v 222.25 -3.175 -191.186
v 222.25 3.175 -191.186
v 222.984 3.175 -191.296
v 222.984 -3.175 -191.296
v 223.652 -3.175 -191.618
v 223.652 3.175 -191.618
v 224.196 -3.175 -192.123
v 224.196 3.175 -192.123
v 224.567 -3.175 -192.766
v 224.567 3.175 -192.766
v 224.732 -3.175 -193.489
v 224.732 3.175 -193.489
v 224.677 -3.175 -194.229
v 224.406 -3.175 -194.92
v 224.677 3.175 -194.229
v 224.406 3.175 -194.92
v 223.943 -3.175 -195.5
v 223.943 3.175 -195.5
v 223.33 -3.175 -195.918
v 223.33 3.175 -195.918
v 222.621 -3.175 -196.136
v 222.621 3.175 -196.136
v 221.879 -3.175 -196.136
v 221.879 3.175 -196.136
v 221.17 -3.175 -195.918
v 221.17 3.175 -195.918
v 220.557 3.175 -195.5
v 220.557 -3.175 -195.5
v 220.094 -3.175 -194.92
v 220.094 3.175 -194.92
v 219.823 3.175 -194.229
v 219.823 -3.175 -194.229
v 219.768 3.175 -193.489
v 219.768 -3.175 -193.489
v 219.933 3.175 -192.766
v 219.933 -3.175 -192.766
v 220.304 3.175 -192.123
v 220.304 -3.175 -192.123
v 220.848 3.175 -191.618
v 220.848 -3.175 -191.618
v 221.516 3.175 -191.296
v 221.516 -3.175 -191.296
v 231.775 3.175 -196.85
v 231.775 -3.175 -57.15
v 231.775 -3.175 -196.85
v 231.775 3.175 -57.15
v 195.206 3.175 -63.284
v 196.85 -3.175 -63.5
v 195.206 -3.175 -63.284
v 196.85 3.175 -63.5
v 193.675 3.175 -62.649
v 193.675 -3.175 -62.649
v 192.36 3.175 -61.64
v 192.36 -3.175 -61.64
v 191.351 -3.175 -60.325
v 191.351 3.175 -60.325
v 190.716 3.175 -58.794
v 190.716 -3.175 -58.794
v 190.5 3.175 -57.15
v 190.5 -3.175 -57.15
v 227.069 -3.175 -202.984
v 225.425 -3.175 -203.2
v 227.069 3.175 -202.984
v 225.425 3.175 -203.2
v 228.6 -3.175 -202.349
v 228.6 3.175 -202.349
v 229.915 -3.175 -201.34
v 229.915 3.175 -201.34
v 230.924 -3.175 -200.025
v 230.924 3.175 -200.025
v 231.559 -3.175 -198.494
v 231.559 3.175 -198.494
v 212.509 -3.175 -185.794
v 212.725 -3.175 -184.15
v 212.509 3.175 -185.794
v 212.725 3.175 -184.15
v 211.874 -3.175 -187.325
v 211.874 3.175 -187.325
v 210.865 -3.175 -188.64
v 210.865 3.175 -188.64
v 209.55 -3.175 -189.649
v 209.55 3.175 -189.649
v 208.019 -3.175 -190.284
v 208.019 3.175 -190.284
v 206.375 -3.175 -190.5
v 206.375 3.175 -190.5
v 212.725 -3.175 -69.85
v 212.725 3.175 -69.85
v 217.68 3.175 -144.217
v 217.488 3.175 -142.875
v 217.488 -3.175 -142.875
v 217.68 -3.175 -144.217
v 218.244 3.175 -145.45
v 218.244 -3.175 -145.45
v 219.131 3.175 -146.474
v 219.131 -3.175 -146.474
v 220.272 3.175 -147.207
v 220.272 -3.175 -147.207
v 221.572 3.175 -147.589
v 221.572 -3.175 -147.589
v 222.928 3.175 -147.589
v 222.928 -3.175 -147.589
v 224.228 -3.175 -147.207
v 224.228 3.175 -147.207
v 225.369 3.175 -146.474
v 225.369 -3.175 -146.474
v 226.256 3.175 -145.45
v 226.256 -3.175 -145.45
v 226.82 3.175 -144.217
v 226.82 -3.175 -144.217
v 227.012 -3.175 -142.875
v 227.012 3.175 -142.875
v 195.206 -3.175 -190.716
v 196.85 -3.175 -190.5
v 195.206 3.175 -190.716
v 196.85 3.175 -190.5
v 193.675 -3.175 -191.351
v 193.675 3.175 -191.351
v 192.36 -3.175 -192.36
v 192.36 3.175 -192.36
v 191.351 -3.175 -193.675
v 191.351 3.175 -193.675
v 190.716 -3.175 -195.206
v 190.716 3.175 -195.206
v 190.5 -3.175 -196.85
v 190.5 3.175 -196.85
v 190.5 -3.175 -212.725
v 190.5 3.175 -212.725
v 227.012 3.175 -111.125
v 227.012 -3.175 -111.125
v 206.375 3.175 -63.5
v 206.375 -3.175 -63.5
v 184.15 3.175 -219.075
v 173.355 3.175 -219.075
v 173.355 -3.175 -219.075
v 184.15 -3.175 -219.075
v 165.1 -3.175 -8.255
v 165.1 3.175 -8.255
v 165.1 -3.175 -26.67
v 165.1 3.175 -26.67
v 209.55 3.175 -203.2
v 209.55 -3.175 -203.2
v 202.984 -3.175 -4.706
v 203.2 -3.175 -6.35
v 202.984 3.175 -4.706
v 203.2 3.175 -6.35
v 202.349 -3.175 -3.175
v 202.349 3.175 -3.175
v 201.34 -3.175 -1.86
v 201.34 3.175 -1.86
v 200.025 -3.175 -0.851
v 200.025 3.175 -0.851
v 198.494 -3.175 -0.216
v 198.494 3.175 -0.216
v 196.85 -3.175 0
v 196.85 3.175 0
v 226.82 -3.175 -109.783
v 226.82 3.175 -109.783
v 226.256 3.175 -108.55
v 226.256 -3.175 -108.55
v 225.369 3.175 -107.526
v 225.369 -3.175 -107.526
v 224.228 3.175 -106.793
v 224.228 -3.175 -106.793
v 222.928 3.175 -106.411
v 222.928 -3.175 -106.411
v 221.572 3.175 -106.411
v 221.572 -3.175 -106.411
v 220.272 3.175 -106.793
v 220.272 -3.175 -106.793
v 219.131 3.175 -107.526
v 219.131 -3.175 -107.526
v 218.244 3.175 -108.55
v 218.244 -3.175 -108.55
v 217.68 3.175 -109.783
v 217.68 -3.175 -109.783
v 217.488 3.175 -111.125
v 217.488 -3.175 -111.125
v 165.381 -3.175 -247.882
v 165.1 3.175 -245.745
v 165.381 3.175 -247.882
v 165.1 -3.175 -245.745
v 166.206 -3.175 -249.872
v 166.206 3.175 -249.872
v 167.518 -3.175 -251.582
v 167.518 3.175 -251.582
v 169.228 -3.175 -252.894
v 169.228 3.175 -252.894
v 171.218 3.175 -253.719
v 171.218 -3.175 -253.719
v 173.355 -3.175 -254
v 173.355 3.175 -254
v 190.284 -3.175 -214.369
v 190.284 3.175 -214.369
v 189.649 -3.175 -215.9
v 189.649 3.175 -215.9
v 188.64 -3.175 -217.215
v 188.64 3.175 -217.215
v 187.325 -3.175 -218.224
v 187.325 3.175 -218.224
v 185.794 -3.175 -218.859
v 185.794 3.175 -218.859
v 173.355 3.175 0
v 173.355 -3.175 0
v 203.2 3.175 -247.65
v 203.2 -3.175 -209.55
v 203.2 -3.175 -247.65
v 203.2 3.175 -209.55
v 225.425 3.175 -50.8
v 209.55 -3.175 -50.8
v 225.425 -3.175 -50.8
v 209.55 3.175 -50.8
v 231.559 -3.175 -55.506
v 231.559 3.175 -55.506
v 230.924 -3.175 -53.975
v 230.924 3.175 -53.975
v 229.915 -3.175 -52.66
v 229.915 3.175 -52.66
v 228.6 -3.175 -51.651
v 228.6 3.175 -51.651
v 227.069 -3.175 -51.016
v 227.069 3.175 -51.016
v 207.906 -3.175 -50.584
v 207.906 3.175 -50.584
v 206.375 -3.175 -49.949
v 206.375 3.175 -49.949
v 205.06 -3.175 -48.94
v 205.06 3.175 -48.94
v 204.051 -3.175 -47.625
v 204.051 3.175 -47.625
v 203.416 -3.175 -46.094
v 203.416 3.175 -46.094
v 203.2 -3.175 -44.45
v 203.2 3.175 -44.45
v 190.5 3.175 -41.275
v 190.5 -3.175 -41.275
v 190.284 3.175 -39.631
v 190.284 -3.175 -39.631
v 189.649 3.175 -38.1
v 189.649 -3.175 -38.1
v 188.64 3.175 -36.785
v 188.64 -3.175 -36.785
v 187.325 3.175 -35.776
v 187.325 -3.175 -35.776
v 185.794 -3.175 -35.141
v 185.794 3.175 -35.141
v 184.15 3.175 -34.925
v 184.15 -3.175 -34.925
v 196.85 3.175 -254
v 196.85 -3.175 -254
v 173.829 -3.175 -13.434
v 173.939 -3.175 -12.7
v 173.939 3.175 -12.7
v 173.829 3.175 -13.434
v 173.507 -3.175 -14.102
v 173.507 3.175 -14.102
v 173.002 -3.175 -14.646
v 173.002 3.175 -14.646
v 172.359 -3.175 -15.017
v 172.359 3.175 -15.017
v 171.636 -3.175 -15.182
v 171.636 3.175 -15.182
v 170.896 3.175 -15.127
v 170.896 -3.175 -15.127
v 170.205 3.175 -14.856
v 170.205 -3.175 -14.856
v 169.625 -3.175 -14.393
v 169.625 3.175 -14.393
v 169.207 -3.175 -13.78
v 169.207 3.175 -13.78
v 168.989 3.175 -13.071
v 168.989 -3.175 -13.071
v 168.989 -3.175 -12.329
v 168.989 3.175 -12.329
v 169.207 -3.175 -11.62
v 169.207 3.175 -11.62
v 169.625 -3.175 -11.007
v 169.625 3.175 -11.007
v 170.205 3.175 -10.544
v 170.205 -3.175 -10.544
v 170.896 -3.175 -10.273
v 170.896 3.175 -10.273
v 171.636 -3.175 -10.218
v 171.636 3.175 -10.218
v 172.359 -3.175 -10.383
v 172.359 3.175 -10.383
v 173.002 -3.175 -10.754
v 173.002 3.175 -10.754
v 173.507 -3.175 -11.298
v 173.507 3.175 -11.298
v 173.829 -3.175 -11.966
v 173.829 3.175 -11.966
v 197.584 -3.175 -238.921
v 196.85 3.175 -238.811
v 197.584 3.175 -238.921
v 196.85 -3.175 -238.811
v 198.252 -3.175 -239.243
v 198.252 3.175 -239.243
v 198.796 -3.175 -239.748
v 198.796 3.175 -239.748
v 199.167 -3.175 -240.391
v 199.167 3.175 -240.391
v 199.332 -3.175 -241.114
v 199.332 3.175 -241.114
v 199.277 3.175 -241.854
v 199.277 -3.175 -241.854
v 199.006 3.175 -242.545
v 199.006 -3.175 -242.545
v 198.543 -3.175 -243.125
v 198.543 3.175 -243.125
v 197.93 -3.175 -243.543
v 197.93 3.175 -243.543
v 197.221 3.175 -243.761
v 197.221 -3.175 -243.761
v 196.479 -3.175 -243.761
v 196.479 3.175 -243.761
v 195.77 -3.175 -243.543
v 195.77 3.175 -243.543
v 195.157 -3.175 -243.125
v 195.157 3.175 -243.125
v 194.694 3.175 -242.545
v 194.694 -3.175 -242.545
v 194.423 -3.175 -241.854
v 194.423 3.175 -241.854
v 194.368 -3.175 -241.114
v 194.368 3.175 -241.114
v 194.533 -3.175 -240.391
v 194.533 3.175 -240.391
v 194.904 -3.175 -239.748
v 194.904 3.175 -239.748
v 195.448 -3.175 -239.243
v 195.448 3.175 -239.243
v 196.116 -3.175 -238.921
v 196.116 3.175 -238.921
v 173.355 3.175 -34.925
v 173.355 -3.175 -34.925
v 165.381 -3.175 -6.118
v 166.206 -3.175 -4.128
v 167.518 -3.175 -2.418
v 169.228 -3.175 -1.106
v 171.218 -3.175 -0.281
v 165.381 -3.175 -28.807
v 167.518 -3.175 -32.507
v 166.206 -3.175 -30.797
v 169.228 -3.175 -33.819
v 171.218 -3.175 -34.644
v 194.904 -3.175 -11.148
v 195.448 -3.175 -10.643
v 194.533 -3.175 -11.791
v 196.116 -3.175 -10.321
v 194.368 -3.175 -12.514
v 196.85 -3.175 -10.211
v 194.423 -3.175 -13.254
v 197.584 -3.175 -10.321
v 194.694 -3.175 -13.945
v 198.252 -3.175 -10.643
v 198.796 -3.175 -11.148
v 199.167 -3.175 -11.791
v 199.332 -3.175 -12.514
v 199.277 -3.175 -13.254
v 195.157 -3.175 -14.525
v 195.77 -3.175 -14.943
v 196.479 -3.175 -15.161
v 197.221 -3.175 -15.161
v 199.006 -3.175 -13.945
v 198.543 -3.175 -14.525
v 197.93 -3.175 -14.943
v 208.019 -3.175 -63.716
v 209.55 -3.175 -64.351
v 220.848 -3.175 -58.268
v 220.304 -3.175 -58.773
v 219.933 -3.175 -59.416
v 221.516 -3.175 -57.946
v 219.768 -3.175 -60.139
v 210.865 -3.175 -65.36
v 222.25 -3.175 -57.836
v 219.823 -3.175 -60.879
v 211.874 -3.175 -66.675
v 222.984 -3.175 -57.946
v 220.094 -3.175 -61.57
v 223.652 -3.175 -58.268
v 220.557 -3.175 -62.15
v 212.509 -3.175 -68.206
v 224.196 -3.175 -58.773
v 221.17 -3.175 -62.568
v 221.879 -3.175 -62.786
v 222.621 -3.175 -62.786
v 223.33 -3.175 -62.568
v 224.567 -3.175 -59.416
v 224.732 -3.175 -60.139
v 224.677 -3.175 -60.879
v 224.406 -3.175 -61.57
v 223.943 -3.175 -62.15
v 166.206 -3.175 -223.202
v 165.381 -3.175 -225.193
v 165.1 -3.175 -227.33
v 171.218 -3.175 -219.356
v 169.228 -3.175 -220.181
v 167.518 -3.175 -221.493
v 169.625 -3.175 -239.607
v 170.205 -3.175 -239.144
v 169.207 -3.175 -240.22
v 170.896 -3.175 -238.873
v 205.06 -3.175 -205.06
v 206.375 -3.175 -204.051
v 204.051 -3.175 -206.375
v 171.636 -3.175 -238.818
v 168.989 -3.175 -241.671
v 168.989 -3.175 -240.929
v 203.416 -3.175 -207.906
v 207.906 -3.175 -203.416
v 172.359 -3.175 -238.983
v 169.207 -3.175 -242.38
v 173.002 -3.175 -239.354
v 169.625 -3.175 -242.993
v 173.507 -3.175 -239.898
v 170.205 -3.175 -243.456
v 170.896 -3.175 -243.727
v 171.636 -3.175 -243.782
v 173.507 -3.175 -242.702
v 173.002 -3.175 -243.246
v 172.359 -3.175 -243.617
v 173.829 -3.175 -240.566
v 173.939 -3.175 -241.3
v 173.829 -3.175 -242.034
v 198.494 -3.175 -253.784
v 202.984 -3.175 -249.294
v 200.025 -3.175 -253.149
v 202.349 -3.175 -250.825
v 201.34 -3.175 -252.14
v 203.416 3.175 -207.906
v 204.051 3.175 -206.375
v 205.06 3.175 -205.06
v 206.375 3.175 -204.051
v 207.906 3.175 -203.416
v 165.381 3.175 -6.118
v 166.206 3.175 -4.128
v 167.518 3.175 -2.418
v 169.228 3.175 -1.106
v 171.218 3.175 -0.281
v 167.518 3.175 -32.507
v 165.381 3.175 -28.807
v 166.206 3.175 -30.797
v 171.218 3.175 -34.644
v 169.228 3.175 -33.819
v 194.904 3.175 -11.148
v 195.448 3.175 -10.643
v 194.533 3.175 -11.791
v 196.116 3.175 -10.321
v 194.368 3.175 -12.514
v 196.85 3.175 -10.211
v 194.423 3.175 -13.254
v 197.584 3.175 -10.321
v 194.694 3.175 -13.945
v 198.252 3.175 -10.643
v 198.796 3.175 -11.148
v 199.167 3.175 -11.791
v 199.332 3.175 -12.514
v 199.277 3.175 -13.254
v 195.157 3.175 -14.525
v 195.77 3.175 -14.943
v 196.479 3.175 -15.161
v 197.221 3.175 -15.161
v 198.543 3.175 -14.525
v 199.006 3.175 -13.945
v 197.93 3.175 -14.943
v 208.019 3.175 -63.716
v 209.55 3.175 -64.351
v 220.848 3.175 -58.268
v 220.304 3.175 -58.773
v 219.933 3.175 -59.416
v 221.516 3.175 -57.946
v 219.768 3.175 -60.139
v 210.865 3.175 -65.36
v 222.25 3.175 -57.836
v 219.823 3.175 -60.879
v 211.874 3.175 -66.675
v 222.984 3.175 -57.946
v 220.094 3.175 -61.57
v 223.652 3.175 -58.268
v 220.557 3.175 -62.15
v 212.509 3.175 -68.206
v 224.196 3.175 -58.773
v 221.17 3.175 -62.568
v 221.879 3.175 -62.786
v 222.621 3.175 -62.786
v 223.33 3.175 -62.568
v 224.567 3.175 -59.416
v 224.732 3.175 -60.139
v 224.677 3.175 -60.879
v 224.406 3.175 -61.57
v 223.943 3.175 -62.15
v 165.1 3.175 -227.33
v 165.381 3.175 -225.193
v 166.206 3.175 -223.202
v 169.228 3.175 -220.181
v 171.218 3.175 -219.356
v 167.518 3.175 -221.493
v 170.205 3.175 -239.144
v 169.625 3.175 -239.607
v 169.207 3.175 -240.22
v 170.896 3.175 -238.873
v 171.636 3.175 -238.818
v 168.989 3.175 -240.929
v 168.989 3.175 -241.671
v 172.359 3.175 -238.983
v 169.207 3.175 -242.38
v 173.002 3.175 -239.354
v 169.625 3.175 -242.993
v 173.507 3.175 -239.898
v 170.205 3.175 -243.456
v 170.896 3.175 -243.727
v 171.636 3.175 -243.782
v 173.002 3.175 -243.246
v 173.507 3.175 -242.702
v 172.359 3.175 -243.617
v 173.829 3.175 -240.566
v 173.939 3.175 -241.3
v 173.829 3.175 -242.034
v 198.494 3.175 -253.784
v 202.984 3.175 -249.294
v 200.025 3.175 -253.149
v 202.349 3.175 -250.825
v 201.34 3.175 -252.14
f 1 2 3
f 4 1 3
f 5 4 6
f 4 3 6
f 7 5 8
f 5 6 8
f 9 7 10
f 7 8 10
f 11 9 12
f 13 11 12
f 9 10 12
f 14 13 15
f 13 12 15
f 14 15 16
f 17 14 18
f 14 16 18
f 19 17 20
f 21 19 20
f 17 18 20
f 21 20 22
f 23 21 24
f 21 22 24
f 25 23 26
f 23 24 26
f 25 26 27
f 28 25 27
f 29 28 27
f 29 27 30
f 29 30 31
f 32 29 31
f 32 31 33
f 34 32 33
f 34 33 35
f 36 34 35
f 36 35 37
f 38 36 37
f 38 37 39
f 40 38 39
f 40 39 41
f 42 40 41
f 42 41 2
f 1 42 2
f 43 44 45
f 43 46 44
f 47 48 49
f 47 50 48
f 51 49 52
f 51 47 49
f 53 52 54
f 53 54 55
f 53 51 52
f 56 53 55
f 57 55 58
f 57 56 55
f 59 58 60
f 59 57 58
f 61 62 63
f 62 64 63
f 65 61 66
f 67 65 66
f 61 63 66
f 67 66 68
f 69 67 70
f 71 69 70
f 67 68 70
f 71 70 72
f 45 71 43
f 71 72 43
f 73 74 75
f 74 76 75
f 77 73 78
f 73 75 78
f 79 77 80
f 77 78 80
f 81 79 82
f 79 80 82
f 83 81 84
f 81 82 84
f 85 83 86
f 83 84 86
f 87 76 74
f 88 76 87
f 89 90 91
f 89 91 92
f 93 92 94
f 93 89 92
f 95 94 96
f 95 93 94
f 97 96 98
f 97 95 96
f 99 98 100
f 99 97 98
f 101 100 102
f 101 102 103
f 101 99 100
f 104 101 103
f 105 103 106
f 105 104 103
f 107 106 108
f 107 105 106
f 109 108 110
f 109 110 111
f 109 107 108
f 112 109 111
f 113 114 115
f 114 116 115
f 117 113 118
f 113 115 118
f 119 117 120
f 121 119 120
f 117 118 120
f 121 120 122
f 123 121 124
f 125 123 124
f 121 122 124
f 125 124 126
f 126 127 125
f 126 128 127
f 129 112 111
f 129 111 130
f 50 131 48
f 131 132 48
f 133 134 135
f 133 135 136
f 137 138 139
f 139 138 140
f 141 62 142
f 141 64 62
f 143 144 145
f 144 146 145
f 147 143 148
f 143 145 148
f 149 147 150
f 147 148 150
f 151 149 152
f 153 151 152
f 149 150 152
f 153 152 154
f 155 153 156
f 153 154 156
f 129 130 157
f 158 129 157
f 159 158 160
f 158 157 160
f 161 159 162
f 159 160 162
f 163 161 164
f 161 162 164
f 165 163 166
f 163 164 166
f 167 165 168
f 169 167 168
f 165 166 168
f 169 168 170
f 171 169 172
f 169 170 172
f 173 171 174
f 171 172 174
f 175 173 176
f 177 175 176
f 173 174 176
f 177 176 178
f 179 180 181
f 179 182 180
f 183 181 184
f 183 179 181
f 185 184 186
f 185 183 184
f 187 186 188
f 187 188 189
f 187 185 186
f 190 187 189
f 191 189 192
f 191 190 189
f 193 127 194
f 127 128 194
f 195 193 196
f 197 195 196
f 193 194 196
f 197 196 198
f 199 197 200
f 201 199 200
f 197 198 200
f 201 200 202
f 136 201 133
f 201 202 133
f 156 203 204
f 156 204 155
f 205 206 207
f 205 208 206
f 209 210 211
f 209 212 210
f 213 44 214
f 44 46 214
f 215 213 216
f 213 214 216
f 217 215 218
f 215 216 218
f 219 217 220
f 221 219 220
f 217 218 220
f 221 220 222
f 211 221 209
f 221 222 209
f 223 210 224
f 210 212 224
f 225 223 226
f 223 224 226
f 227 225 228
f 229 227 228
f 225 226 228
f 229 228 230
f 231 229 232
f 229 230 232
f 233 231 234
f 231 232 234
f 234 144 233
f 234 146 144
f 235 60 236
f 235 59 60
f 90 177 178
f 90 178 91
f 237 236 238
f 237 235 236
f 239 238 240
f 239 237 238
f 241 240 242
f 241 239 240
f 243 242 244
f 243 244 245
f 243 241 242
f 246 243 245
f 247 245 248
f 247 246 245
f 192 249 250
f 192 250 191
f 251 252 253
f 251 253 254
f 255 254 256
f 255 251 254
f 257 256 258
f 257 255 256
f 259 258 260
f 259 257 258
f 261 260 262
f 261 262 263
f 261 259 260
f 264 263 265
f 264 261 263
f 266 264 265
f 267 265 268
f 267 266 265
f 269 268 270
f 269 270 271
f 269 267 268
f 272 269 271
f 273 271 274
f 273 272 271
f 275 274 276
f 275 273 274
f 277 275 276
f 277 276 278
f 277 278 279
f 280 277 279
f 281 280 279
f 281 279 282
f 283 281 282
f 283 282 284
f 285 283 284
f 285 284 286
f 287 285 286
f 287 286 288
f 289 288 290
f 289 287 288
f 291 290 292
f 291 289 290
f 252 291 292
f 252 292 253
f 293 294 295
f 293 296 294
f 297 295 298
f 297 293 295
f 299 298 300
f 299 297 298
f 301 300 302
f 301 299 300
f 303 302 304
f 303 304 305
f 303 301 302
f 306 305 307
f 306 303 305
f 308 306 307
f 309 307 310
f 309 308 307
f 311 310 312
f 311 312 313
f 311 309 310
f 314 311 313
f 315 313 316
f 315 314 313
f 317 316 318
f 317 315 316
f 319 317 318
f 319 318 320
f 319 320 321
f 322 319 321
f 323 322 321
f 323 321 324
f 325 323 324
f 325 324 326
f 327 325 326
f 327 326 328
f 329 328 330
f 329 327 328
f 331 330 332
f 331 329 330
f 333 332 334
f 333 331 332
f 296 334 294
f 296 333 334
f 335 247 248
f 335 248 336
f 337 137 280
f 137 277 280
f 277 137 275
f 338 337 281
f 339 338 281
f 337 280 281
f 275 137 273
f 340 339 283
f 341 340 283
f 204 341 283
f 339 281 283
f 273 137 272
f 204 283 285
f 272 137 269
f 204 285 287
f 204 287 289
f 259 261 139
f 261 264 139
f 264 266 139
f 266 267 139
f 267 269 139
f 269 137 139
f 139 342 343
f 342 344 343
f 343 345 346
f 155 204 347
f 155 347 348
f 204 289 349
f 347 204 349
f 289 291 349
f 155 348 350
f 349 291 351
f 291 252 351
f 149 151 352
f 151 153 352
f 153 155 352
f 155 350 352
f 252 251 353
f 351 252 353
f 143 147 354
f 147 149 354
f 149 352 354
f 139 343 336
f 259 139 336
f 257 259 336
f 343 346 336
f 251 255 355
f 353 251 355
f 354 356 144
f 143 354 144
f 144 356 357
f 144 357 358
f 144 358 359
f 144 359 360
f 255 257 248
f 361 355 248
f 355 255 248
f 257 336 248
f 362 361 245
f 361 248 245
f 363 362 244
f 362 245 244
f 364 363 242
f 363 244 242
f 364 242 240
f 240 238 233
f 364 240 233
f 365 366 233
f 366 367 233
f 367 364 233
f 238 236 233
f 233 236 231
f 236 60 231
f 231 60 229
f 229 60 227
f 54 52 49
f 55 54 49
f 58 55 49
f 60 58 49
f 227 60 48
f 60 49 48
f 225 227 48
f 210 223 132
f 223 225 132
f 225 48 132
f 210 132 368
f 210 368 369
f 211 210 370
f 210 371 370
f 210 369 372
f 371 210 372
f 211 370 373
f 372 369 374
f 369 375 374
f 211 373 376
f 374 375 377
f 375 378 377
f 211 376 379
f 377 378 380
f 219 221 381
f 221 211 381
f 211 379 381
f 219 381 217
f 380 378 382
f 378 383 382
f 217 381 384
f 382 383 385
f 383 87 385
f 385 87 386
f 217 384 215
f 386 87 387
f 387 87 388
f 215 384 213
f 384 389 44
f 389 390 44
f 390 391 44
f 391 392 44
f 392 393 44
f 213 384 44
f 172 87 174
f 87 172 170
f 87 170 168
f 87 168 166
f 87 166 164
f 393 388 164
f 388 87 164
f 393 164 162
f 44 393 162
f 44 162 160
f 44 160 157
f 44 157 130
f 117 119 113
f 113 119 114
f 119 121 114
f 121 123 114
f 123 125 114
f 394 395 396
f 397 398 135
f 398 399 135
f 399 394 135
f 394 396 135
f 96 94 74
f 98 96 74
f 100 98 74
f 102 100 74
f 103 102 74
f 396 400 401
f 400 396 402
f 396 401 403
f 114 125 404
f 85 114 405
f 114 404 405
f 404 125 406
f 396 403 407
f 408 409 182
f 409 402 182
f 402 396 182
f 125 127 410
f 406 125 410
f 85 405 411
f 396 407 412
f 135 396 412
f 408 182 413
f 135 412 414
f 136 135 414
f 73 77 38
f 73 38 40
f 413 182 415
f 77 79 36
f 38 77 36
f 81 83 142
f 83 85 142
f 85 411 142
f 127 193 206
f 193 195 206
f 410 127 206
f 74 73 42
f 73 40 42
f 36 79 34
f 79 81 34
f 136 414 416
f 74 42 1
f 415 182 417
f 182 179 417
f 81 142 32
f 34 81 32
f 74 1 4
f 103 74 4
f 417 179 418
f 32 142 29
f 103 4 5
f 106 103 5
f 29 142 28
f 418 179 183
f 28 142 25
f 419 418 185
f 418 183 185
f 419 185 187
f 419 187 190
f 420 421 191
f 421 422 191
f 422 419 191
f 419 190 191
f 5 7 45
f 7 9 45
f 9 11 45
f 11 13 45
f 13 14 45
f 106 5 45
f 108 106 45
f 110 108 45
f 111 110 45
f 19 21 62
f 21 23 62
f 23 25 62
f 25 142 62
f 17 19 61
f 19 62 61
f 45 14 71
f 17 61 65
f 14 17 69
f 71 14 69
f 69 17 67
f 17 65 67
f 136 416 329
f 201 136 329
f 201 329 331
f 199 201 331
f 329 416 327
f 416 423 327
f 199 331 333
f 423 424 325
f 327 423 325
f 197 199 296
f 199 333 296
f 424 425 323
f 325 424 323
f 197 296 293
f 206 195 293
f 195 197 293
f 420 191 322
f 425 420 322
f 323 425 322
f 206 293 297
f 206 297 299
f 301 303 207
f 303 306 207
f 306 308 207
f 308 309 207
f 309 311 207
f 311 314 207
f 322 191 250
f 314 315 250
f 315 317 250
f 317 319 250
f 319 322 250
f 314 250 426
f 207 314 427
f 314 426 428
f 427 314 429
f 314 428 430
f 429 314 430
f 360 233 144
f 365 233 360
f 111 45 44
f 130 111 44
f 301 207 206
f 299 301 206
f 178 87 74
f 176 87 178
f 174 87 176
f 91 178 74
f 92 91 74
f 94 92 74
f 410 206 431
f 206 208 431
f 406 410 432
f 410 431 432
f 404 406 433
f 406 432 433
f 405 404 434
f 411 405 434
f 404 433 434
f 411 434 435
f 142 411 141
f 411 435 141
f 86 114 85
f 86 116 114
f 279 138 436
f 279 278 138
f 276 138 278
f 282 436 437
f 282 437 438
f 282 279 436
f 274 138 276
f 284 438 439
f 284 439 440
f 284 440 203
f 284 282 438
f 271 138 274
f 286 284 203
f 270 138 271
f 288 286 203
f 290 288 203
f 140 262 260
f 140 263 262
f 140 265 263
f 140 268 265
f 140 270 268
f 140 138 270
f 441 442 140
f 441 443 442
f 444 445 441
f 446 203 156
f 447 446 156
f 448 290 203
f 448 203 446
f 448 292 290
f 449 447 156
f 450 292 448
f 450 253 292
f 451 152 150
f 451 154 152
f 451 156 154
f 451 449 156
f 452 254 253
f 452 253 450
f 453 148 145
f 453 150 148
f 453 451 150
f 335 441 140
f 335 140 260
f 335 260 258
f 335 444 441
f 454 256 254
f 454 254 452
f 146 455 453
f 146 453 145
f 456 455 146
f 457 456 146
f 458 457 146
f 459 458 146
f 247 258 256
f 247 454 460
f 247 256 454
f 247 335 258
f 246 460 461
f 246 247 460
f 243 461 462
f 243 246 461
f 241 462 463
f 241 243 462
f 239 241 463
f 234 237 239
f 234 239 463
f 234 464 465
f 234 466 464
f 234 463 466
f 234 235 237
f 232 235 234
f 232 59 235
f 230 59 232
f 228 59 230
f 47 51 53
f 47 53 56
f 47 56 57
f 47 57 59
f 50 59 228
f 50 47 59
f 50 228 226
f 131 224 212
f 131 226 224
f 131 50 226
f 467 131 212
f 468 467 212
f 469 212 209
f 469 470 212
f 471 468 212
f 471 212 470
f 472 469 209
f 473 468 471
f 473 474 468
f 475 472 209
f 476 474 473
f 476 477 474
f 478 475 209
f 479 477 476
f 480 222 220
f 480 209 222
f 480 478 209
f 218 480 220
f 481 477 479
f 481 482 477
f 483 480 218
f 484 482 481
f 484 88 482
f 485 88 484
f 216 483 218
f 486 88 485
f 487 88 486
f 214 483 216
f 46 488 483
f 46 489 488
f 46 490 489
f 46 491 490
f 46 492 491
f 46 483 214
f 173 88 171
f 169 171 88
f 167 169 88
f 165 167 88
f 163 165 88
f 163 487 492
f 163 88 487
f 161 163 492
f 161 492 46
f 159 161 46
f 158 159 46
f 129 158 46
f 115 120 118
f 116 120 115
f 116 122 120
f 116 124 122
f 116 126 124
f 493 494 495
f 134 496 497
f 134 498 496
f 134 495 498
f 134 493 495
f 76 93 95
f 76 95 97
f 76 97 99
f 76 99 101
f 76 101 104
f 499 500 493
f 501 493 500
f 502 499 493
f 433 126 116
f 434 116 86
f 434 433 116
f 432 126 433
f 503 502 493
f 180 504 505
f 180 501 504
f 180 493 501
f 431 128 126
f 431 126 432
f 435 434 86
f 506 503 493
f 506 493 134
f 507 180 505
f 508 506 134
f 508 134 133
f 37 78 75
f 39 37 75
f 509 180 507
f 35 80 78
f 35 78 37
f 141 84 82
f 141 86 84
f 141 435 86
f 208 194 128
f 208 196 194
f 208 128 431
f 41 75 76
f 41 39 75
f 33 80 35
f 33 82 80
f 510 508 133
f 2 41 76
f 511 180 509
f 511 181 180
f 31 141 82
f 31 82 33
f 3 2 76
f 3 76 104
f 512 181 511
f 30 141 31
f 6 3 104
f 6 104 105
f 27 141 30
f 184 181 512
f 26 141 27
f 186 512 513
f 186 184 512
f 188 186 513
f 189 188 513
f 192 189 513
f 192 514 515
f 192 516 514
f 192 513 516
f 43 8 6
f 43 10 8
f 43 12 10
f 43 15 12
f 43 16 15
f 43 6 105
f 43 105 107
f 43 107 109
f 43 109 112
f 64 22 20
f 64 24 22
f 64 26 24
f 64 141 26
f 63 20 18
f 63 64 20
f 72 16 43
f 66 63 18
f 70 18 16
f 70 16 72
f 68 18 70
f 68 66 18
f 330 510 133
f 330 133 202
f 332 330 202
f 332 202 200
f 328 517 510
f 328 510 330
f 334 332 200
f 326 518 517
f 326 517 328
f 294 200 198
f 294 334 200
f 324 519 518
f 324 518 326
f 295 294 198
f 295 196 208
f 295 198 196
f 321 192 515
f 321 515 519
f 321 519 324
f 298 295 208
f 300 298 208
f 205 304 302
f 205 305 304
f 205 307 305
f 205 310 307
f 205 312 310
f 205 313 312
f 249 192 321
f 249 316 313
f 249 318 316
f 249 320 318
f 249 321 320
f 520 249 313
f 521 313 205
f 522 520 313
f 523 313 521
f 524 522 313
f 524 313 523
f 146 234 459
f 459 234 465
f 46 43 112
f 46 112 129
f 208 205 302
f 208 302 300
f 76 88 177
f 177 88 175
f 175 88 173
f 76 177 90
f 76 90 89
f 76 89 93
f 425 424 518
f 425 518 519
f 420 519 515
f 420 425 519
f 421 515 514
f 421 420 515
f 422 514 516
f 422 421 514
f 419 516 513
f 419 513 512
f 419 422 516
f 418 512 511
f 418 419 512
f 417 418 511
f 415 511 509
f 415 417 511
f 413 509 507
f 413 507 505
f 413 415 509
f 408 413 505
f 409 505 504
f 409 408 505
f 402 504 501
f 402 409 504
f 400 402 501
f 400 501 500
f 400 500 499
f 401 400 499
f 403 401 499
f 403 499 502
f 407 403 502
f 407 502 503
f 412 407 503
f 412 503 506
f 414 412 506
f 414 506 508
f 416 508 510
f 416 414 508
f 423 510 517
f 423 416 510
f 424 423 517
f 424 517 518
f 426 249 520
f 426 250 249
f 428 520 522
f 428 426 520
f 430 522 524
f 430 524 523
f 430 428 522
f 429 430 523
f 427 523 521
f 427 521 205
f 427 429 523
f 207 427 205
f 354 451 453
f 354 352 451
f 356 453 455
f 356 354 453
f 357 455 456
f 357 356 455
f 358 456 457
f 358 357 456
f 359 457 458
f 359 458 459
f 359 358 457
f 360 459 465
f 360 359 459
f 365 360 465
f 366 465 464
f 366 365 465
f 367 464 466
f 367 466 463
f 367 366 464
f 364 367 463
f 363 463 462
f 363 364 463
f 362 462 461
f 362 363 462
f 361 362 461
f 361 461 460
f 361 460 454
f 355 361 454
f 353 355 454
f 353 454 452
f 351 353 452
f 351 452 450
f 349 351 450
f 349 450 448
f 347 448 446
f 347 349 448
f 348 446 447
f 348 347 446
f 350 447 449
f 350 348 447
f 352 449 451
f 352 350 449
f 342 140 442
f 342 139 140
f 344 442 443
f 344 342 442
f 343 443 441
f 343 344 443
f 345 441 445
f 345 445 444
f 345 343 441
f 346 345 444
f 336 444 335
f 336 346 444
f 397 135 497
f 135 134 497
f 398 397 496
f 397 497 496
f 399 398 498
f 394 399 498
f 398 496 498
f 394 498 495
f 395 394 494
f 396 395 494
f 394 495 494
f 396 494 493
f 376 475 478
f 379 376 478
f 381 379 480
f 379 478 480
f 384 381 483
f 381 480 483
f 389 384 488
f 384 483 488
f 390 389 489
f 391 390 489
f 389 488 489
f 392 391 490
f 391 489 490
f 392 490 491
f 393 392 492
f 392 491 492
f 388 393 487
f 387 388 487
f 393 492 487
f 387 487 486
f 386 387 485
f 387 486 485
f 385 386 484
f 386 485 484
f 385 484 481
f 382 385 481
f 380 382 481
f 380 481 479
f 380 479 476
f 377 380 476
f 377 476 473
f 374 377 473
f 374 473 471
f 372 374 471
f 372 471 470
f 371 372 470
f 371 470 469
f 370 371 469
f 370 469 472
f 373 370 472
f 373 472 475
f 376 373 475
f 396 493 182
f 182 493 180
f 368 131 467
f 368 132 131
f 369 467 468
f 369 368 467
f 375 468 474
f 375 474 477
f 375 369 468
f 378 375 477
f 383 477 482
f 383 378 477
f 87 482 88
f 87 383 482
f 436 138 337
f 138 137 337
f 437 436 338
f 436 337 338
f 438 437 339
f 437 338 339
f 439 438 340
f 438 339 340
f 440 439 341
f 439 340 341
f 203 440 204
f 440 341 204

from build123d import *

# Parameters (mm, degrees)
SKETCH1_R           = 2.4892
BOSS_EXTRUDE1_DEPTH = 3.175
FILLET1_R           = 6.35
LPATTERN1_START     = -3.175
LPATTERN1_OUTLINE_R = 2.4892
LPATTERN1_DEPTH     = 6.35
SKETCH2_R           = 2.4892
SKETCH2_W           = 193.675
SKETCH2_H           = 254
CUT_EXTRUDE1_DEPTH  = 344.912740568
FILLET2_R           = 8.255


# Read off the part's stored shape, not the designer's step: LPattern1
with BuildPart() as part:
    # Sketch1 → Boss-Extrude1 (new, symmetric)
    with BuildSketch(Plane(origin=(0, 0, 0), x_dir=(1, 0, 0), z_dir=(0, 1, 0))):
        Polygon((0, 50.8), (0, 0), (203.2, 0), (203.2, 50.8), (231.775, 50.8), (231.775, 203.2), (203.2, 203.2), (203.2, 254), (0, 254), (0, 203.2), (-28.575, 203.2), (-28.575, 50.8), align=None)
        with Locations(Location((196.85, 12.7, 0), (0, 0, 270))):
            Circle(SKETCH1_R, mode=Mode.SUBTRACT)
        Polygon((12.7, 190.5), (12.7, 219.075), (190.5, 219.075), (190.5, 190.5), (212.725, 190.5), (212.725, 63.5), (190.5, 63.5), (190.5, 34.925), (12.7, 34.925), (12.7, 63.5), (-9.525, 63.5), (-9.525, 190.5), align=None, mode=Mode.SUBTRACT)
        with BuildLine():
            Line((227.0125, 142.875), (227.0125, 111.125))
            ThreePointArc((227.0125, 111.125), (222.25, 106.3625), (217.4875, 111.125))
            Line((217.4875, 111.125), (217.4875, 142.875))
            ThreePointArc((217.4875, 142.875), (222.25, 147.6375), (227.0125, 142.875))
        make_face(mode=Mode.SUBTRACT)
        with BuildLine():
            ThreePointArc((-14.2875, 111.125), (-19.05, 106.3625), (-23.8125, 111.125))
            Line((-23.8125, 111.125), (-23.8125, 142.875))
            ThreePointArc((-23.8125, 142.875), (-19.05, 147.6375), (-14.2875, 142.875))
            Line((-14.2875, 142.875), (-14.2875, 111.125))
        make_face(mode=Mode.SUBTRACT)
        with Locations(Location((196.85, 241.3, 0), (0, 0, 270))):
            Circle(SKETCH1_R, mode=Mode.SUBTRACT)
    extrude(amount=BOSS_EXTRUDE1_DEPTH, both=True)

    # Fillet1
    fillet1_edges = [part.edges().sort_by_distance(p)[0] for p in [
        (0, 0, 0),
        (0, 0, -50.8),
        (-28.575, 0, -50.8),
        (-28.575, 0, -203.2),
        (0, 0, -203.2),
        (0, 0, -254),
        (203.2, 0, -254),
        (203.2, 0, -203.2),
        (231.775, 0, -203.2),
        (231.775, 0, -50.8),
        (203.2, 0, -50.8),
        (203.2, 0, 0),
        (212.725, 0, -190.5),
        (190.5, 0, -190.5),
        (190.5, 0, -219.075),
        (12.7, 0, -219.075),
        (12.7, 0, -190.5),
        (-9.525, 0, -190.5),
        (-9.525, 0, -63.5),
        (12.7, 0, -63.5),
        (12.7, 0, -34.925),
        (190.5, 0, -34.925),
        (190.5, 0, -63.5),
        (212.725, 0, -63.5),
    ]]
    fillet(fillet1_edges, radius=FILLET1_R)

    # LPattern1 outline → LPattern1 (cut)
    with BuildSketch(Plane(origin=(0, 0, 0), x_dir=(1, 0, 0), z_dir=(0, 1, 0)).offset(LPATTERN1_START)):
        with Locations((19.05, 12.7)):
            Circle(LPATTERN1_OUTLINE_R)
        with Locations((19.05, 241.3)):
            Circle(LPATTERN1_OUTLINE_R)
        with Locations((44.45, 12.7)):
            Circle(LPATTERN1_OUTLINE_R)
        with Locations((44.45, 241.3)):
            Circle(LPATTERN1_OUTLINE_R)
        with Locations((69.85, 12.7)):
            Circle(LPATTERN1_OUTLINE_R)
        with Locations((69.85, 241.3)):
            Circle(LPATTERN1_OUTLINE_R)
        with Locations((95.25, 12.7)):
            Circle(LPATTERN1_OUTLINE_R)
        with Locations((95.25, 241.3)):
            Circle(LPATTERN1_OUTLINE_R)
        with Locations((120.65, 12.7)):
            Circle(LPATTERN1_OUTLINE_R)
        with Locations((120.65, 241.3)):
            Circle(LPATTERN1_OUTLINE_R)
        with Locations((146.05, 12.7)):
            Circle(LPATTERN1_OUTLINE_R)
        with Locations((146.05, 241.3)):
            Circle(LPATTERN1_OUTLINE_R)
        with Locations((171.45, 12.7)):
            Circle(LPATTERN1_OUTLINE_R)
        with Locations((171.45, 241.3)):
            Circle(LPATTERN1_OUTLINE_R)
    extrude(amount=LPATTERN1_DEPTH, mode=Mode.SUBTRACT)

    # Sketch2 → Cut-Extrude1 (cut, through all)
    with BuildSketch(Plane(origin=(0, 3.175, 0), x_dir=(1, 0, 0), z_dir=(0, 1, 0))):
        with Locations(Location((222.25, 193.675, 0), (0, 0, 270))):
            Circle(SKETCH2_R)
        with Locations(Location((222.25, 60.325, 0), (0, 0, 270))):
            Circle(SKETCH2_R)
        with Locations((68.2625, 127)):
            Rectangle(SKETCH2_W, SKETCH2_H)
    extrude(amount=-CUT_EXTRUDE1_DEPTH, mode=Mode.SUBTRACT)

    # Fillet2
    fillet2_edges = [part.edges().sort_by_distance(p)[0] for p in [
        (165.1, 0, -34.925),
        (165.1, 0, -219.075),
        (165.1, 0, -254),
        (165.1, 0, 0),
    ]]
    fillet(fillet2_edges, radius=FILLET2_R)


solid = part.part
